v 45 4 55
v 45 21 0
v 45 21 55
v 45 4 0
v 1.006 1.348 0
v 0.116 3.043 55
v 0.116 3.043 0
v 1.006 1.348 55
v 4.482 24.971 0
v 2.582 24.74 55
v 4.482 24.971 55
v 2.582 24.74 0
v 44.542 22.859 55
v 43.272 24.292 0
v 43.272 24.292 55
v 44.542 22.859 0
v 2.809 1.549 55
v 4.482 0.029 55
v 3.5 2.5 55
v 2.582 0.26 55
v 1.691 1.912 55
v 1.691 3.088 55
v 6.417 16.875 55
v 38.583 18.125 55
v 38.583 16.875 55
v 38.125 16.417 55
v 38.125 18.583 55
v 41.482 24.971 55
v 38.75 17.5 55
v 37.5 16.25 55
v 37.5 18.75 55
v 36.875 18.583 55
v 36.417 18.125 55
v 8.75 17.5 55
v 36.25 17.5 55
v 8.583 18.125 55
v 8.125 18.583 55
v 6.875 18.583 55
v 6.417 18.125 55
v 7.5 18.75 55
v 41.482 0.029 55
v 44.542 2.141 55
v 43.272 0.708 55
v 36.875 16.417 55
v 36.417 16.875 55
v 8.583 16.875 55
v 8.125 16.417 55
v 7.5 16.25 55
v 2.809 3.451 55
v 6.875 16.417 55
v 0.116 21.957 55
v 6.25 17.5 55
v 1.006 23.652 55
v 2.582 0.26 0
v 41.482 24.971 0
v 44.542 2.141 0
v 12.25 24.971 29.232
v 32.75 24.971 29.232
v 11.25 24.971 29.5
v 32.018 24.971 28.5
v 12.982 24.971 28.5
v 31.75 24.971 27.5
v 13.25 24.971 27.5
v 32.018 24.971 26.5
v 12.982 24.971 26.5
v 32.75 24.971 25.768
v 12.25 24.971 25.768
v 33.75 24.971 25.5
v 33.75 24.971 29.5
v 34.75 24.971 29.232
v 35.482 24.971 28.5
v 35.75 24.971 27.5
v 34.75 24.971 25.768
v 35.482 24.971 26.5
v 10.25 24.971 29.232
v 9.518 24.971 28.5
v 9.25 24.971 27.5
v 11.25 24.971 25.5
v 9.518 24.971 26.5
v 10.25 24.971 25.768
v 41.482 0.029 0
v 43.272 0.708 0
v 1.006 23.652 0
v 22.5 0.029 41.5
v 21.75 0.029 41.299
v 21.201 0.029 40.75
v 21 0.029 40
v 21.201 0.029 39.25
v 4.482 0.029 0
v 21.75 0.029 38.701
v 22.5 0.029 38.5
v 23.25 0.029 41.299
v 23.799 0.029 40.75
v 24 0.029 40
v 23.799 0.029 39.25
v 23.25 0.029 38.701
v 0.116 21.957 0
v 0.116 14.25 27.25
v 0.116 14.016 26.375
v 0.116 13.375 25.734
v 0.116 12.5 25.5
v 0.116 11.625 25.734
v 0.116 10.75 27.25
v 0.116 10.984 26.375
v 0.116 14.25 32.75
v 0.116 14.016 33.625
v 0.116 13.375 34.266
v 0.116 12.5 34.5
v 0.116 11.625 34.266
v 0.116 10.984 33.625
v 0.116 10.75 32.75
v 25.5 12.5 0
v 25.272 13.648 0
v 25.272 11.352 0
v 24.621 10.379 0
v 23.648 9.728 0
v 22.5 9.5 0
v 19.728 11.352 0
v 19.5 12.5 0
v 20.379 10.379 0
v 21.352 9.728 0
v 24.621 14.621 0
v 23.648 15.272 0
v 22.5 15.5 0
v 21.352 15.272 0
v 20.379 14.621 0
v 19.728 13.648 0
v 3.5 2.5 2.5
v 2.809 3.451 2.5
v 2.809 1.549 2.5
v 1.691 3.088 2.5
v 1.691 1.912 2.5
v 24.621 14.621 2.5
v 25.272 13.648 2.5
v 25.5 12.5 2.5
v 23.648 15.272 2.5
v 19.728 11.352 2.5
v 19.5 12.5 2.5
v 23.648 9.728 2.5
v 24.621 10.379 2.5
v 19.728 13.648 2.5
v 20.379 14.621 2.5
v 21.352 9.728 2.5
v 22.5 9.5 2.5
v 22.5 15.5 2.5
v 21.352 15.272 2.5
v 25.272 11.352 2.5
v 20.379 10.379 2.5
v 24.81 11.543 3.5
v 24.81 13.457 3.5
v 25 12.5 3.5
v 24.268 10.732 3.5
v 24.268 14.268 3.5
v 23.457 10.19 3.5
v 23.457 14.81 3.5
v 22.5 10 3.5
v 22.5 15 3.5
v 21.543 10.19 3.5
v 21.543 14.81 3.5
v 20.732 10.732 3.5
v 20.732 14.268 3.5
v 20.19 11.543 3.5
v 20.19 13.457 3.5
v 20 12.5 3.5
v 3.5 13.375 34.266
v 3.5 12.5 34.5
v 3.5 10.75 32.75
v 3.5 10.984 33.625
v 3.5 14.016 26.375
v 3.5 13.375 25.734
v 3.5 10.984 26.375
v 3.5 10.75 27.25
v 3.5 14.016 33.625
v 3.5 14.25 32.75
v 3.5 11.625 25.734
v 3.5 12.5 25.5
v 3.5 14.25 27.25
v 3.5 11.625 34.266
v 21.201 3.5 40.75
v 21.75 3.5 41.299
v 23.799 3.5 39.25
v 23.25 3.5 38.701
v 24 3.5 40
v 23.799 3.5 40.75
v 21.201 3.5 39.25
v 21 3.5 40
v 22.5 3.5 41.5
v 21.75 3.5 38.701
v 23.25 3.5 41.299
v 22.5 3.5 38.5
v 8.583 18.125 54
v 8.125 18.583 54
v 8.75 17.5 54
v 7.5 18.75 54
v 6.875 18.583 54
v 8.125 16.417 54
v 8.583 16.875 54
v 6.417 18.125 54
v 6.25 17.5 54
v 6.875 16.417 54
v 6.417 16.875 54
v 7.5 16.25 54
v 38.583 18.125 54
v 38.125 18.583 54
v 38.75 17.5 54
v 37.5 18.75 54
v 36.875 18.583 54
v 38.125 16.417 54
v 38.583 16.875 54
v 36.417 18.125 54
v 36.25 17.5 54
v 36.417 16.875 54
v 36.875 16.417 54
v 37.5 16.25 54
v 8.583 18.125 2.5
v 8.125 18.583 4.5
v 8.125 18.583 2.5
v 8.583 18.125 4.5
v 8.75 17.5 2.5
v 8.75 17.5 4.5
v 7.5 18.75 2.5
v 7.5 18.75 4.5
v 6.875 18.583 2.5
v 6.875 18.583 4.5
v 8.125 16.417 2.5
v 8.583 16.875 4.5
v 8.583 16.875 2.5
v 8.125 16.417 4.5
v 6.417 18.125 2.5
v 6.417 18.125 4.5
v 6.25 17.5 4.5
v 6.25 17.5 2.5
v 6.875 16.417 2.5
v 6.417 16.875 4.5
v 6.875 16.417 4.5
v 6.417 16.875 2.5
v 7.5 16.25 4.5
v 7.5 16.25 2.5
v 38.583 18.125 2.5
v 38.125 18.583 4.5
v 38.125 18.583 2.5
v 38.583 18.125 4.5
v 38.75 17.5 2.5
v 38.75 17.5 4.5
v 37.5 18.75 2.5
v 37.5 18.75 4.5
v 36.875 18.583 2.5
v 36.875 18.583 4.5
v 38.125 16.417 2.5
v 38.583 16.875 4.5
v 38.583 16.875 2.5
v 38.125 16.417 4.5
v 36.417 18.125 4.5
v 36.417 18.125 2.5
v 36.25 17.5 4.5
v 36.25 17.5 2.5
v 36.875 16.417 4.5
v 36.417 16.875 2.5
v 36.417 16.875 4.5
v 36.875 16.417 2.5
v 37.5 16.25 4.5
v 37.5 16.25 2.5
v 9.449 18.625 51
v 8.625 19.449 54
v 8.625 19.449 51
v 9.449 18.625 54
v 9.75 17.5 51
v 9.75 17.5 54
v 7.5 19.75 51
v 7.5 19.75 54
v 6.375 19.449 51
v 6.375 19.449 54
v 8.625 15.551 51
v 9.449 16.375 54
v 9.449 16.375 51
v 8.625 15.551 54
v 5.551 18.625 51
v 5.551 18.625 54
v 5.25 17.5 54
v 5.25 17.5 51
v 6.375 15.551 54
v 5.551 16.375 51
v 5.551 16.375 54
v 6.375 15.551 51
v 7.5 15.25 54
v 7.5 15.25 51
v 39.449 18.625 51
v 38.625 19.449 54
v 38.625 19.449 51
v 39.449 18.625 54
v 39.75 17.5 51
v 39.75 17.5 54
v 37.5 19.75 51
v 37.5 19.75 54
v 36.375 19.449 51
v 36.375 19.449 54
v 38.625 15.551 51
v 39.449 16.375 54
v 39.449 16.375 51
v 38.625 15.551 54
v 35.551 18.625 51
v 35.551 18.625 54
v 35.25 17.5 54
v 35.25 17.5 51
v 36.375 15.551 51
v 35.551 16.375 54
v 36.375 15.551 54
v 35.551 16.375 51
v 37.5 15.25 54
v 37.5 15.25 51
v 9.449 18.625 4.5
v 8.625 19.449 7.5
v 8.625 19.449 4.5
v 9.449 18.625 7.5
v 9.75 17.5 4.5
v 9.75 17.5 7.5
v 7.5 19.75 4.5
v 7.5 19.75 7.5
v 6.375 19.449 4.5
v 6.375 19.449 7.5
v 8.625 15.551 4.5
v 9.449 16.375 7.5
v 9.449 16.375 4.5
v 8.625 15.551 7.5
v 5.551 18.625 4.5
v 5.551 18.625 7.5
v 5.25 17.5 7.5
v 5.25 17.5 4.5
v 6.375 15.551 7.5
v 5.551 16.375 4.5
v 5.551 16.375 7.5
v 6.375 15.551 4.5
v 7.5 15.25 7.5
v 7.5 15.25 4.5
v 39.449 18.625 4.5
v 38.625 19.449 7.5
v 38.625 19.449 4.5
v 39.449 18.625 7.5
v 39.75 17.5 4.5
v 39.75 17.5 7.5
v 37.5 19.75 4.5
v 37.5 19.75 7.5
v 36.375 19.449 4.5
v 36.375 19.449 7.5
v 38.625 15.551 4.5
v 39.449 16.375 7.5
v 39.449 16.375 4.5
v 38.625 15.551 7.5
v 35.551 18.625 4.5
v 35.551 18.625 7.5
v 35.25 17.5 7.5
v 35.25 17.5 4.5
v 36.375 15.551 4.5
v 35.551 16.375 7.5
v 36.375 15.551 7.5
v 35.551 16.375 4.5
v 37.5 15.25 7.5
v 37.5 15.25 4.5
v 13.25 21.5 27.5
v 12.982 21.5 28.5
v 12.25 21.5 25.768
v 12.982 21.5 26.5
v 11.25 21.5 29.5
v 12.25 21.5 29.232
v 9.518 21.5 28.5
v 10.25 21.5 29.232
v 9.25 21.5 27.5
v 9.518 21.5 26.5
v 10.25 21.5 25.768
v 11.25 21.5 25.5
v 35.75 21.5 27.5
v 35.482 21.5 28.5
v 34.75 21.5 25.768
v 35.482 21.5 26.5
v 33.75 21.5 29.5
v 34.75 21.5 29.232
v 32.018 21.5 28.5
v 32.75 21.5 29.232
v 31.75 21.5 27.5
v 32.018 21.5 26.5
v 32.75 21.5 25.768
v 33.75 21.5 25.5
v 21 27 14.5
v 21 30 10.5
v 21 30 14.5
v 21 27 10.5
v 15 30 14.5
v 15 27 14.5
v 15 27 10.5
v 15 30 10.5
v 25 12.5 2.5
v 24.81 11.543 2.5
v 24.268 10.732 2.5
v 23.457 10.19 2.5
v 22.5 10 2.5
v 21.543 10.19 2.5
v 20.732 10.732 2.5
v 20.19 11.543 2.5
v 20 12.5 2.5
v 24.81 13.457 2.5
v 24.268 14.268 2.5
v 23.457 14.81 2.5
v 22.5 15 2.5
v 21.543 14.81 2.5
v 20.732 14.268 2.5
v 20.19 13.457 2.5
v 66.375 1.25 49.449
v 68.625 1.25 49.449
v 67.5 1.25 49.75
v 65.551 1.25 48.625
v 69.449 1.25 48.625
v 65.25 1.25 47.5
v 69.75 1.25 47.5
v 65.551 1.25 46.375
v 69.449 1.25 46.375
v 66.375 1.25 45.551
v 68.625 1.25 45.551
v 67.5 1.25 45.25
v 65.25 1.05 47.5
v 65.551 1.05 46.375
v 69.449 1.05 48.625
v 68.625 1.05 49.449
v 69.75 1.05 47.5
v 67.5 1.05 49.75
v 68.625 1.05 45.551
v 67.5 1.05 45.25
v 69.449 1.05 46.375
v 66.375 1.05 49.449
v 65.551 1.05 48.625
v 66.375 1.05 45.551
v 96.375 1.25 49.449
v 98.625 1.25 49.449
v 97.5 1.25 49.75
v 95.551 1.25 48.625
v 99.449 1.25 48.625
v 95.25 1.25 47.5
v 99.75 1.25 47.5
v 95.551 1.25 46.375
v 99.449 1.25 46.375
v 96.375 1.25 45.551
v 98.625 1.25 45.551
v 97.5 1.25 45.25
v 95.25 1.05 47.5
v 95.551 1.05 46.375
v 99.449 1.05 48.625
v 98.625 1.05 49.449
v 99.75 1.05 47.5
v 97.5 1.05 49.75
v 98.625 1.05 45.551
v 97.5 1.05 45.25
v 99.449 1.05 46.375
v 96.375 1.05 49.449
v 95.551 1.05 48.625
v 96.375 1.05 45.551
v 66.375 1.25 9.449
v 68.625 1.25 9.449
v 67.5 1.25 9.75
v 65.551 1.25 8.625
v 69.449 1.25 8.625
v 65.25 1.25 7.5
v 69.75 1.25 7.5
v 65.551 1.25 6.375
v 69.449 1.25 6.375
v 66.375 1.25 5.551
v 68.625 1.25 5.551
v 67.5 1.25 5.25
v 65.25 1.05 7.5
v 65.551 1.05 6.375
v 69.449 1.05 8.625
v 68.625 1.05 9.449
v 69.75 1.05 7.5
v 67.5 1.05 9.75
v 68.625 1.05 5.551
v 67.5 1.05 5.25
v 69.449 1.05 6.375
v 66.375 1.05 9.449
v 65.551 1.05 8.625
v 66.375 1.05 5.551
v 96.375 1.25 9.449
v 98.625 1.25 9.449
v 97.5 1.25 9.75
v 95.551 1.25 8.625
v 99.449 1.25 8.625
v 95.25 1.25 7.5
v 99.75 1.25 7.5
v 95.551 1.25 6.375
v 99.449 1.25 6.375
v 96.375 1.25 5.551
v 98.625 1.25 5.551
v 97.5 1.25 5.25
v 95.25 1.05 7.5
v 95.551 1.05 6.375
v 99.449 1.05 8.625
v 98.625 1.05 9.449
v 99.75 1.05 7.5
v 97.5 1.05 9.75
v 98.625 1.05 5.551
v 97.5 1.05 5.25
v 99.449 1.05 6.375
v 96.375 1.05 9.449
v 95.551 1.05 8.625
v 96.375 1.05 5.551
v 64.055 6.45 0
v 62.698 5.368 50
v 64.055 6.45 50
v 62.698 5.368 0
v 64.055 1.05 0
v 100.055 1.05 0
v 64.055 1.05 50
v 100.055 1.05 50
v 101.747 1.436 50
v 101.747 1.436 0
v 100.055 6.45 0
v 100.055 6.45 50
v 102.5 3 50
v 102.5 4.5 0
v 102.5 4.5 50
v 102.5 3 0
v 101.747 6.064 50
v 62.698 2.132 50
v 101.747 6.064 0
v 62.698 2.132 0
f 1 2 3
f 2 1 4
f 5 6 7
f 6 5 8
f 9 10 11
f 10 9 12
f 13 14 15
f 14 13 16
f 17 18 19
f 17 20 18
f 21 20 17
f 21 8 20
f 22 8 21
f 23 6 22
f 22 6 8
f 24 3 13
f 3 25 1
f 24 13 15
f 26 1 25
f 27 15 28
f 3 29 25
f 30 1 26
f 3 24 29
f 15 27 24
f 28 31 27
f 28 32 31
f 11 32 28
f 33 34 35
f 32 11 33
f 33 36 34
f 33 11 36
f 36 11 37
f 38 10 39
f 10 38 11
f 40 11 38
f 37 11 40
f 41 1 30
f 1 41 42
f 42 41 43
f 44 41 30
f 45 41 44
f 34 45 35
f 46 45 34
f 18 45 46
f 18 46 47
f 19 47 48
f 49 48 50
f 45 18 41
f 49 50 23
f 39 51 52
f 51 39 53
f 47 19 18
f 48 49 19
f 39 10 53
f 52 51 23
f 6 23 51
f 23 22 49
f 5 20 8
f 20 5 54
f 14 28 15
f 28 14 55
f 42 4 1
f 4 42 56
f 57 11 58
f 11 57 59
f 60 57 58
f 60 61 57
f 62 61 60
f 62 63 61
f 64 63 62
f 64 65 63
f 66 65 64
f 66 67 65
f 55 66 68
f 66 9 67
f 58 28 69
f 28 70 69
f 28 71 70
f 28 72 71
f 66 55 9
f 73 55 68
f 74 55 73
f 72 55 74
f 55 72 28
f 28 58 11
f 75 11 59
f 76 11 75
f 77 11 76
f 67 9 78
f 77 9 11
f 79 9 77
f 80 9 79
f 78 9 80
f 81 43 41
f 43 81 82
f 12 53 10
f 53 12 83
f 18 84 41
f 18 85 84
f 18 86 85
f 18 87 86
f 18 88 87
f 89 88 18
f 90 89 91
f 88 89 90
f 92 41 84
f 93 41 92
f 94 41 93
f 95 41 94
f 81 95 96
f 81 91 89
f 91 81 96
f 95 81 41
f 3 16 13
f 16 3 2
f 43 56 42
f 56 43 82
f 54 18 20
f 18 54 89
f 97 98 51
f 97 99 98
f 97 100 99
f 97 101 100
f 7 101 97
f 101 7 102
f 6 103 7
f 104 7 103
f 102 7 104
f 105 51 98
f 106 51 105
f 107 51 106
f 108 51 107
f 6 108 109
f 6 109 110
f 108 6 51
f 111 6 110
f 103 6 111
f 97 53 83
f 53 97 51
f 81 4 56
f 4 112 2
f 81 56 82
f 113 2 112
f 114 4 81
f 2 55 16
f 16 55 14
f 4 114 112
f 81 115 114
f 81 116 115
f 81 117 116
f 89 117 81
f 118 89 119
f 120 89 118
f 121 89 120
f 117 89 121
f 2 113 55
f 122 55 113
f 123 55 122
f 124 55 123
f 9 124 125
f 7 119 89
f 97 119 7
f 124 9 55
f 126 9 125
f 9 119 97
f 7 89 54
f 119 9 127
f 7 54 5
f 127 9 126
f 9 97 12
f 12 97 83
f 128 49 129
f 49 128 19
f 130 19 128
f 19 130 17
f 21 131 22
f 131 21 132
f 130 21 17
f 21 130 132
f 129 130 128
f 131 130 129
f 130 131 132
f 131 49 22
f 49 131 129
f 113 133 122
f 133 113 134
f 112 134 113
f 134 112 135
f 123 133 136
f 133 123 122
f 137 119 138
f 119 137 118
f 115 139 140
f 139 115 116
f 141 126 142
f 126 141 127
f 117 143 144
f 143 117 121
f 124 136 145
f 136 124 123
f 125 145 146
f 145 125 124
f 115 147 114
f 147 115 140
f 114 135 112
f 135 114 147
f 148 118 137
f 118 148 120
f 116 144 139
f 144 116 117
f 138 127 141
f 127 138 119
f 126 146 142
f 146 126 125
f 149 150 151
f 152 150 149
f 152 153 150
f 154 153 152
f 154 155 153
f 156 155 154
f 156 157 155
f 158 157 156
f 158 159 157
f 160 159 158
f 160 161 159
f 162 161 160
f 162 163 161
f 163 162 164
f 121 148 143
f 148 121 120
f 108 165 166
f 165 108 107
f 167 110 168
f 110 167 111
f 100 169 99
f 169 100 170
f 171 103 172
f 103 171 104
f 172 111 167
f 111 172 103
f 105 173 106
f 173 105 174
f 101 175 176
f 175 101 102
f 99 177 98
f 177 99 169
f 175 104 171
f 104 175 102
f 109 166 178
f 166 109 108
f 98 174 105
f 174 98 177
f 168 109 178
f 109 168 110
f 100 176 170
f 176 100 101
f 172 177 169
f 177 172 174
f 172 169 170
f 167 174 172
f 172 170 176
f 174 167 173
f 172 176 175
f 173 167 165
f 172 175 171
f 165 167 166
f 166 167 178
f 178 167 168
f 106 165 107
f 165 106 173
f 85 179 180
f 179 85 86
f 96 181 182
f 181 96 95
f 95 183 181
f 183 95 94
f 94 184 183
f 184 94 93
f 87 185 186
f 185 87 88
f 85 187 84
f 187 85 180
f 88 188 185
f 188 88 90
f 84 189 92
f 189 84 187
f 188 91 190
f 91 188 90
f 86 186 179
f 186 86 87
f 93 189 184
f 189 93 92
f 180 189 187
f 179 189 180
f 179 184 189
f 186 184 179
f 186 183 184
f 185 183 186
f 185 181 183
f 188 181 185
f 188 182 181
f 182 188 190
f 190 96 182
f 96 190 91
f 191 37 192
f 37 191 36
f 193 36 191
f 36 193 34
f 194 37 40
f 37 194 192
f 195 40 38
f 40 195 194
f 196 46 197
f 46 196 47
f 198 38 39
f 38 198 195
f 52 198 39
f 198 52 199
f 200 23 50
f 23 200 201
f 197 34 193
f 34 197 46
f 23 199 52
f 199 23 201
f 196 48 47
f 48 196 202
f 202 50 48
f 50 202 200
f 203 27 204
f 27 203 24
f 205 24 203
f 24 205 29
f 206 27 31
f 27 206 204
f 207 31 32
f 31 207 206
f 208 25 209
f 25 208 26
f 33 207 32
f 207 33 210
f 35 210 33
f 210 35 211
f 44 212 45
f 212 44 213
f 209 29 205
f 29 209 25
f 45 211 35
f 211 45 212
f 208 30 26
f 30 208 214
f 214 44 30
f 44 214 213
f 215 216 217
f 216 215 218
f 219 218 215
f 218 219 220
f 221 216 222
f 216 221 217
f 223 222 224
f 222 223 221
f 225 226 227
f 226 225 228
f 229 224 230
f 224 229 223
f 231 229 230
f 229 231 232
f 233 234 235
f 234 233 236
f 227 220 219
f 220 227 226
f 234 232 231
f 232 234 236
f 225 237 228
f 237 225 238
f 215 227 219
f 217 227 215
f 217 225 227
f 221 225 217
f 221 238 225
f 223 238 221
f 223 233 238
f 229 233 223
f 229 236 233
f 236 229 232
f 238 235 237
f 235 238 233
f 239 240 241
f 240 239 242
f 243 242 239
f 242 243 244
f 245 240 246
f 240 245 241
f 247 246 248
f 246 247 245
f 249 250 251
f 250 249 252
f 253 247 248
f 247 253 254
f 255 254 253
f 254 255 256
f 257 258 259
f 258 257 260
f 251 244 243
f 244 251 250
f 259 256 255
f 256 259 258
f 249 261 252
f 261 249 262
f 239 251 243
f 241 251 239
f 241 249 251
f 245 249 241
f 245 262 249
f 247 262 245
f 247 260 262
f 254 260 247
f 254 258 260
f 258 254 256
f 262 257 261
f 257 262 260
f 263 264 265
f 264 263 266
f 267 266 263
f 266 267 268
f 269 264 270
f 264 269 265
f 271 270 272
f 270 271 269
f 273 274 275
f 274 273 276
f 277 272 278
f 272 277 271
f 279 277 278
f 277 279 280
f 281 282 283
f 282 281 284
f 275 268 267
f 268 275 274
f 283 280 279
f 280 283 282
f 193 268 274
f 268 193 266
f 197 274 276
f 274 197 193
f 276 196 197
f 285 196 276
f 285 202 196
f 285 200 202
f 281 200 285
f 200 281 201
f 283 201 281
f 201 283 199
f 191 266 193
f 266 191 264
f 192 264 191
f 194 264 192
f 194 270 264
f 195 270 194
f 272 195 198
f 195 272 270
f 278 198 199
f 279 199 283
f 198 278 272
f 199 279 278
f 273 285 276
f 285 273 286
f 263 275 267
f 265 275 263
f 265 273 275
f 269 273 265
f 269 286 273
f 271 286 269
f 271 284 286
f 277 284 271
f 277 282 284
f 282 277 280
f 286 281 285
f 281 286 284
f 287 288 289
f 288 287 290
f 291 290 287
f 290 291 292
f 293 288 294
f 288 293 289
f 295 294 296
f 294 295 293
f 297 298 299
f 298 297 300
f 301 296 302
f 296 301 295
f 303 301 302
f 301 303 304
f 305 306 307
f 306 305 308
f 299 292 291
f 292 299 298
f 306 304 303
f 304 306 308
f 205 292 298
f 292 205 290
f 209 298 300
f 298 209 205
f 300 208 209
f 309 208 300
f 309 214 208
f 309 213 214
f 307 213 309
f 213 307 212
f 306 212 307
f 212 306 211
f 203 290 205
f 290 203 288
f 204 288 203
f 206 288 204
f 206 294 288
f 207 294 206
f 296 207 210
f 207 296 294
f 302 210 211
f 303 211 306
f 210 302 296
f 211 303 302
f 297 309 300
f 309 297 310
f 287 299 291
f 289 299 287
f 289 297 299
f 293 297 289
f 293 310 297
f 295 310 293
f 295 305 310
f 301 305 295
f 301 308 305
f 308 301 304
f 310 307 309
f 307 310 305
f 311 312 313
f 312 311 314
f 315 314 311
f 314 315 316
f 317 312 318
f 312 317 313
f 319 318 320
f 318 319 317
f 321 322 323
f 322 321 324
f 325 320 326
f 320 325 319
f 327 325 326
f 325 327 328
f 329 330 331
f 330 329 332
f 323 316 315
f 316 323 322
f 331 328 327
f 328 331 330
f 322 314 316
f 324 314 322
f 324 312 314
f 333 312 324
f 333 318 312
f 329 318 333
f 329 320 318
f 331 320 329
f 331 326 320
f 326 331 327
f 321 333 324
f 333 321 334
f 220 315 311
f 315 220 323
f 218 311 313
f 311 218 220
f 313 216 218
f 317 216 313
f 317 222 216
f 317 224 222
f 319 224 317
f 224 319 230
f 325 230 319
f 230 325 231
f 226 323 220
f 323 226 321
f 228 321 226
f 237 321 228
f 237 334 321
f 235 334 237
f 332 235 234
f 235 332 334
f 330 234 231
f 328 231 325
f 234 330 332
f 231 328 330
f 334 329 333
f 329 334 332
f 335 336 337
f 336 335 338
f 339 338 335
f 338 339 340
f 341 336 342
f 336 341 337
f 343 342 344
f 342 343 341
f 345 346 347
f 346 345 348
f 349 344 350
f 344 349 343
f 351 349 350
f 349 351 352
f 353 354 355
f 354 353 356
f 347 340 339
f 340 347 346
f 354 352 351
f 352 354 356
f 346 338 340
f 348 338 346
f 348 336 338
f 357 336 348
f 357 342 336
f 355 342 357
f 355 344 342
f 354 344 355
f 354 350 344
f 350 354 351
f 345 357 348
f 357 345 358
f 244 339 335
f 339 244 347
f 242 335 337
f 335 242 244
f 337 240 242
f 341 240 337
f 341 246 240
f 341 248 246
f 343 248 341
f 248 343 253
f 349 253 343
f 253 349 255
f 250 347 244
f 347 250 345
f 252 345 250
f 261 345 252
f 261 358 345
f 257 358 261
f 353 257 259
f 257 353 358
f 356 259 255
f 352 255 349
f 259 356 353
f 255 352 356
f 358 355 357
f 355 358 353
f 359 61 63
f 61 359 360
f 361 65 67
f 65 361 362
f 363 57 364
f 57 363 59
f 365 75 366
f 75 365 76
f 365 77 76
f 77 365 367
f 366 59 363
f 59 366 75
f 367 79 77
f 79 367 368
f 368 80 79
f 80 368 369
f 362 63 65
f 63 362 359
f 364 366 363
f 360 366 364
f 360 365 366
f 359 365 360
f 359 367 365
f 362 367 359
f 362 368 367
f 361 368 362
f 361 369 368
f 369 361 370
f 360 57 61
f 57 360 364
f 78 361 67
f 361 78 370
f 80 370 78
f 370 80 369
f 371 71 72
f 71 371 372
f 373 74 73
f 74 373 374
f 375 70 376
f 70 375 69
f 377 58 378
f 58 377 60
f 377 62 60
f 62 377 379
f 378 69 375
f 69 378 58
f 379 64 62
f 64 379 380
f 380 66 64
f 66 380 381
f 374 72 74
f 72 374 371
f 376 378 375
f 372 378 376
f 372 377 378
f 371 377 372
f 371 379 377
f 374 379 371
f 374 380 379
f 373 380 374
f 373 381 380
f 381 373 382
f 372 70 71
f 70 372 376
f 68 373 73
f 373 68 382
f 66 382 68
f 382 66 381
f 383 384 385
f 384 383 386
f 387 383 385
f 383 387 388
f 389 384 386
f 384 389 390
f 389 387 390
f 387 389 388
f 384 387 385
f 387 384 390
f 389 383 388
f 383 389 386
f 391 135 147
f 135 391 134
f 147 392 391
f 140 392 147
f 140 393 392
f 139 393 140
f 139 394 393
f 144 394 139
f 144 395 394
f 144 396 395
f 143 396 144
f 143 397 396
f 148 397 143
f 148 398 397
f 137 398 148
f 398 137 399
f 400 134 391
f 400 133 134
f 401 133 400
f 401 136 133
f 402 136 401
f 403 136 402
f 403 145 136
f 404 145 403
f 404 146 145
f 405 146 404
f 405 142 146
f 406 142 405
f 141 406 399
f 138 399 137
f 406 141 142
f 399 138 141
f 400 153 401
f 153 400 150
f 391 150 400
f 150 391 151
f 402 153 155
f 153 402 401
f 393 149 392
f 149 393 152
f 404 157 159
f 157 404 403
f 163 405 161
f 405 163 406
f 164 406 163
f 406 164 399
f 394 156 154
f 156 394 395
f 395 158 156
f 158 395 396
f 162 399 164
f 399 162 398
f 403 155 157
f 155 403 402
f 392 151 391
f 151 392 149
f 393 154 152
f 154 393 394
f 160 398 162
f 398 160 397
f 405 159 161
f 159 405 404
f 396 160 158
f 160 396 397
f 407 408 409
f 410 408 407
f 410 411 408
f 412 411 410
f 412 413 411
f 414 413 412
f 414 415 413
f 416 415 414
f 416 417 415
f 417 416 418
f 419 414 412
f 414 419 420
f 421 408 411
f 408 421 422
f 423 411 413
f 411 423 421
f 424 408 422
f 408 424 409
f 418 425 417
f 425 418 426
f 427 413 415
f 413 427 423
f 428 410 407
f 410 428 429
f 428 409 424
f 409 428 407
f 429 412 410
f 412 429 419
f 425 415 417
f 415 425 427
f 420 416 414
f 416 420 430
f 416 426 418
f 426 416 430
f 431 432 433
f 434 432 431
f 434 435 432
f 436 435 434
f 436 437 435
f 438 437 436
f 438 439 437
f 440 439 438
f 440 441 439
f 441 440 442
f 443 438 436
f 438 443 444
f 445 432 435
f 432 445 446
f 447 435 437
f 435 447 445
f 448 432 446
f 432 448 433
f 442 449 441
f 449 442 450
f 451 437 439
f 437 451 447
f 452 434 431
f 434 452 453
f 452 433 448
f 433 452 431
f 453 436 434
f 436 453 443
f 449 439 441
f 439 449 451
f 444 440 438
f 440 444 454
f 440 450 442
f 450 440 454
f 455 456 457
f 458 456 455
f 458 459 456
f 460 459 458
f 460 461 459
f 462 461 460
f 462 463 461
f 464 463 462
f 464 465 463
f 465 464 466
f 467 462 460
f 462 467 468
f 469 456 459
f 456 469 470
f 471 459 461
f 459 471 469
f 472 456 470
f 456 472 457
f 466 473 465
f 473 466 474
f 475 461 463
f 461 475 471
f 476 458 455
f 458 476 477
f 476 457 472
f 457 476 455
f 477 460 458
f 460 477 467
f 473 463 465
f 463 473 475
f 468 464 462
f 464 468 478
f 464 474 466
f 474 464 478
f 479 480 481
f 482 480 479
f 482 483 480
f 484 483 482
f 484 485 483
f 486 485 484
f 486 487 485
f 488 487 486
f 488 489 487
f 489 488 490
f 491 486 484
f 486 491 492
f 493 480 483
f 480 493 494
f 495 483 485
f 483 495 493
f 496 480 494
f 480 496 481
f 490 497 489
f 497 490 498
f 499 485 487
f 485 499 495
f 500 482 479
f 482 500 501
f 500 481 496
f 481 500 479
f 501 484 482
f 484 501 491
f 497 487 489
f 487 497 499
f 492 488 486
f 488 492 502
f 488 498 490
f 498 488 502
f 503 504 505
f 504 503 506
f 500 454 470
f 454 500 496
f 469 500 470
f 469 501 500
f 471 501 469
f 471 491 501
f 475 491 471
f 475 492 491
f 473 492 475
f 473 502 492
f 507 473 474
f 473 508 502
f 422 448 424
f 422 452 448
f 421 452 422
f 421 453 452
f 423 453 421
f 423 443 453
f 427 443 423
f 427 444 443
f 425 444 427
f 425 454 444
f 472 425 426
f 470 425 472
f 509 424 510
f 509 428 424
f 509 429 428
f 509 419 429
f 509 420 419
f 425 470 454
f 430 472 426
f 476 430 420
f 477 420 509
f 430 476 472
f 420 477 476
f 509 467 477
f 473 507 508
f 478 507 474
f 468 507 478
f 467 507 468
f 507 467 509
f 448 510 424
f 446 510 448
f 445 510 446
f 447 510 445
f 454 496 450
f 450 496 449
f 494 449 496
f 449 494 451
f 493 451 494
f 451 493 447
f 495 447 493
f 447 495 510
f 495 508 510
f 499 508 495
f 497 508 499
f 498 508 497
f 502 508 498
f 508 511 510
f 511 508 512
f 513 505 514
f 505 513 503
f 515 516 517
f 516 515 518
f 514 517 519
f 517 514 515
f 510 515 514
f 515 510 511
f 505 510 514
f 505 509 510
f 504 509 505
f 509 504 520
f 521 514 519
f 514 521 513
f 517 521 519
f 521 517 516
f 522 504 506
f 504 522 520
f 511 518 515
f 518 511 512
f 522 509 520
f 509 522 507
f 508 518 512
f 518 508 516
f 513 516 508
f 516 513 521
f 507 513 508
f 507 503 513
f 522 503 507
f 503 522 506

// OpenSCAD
// Water Leak Sensor Case
// Xiao ESP32-S3 with UHPPOTE probe
// USB-C powered, screw-on access panel

// ============================================
// PARAMETERS
// ============================================

// Case dimensions
case_width = 45;
case_depth = 25;
case_height = 55;

// Wall thickness
wall = 2.5;

// Access panel (back)
panel_thickness = 2;
screw_diam = 2.5;  // M2.5 screws
screw_head_diam = 4.5;
screw_head_depth = 2;

// Xiao ESP32-S3 dimensions
xiao_width = 21;
xiao_depth = 17.5;

// Probe wire exit
wire_hole = 6;  // For probe cable

// USB-C port
usb_width = 9;
usb_height = 3.5;

// LED indicator
led_diam = 3;

// ============================================
// HELPERS
// ============================================

module rounded_box(l, w, h, r) {
    hull() {
        translate([r, r, 0]) cylinder(r=r, h=h);
        translate([l-r, r, 0]) cylinder(r=r, h=h);
        translate([r, w-r, 0]) cylinder(r=r, h=h);
        translate([l-r, w-r, 0]) cylinder(r=r, h=h);
    }
}

// ============================================
// CASE BODY (main enclosure)
// ============================================

module case_body() {
    difference() {
        // Outer shell
        rounded_box(case_width, case_depth, case_height, 4);
        
        // Inner cavity (open at back)
        translate([wall, wall, wall])
        rounded_box(
            case_width - wall * 2,
            case_depth - wall * 2,
            case_height
        );
        
        // Probe wire exit (bottom, back)
        translate([case_width/2, case_depth/2, -1])
        cylinder(d=wire_hole, h=wall + 2, $fn=16);
        
        // USB-C port (side, near top)
        translate([-1, case_depth/2, case_height - 25])
        rotate([0, 90, 0])
        hull() {
            translate([-usb_width/2 + usb_height/2, 0, 0])
            cylinder(d=usb_height, h=wall + 2, $fn=12);
            translate([usb_width/2 - usb_height/2, 0, 0])
            cylinder(d=usb_height, h=wall + 2, $fn=12);
        }
        
        // LED hole (front, near top)
        translate([case_width/2, -1, case_height - 15])
        rotate([-90, 0, 0])
        cylinder(d=led_diam, h=wall + 2, $fn=12);
        
        // Screw holes for access panel (back)
        // Top left
        translate([wall + 5, case_depth - wall - 5, case_height - wall])
        cylinder(d=screw_diam, h=wall + 2, $fn=12);
        // Top right
        translate([case_width - wall - 5, case_depth - wall - 5, case_height - wall])
        cylinder(d=screw_diam, h=wall + 2, $fn=12);
        // Bottom left
        translate([wall + 5, case_depth - wall - 5, wall])
        cylinder(d=screw_diam, h=wall + 2, $fn=12);
        // Bottom right
        translate([case_width - wall - 5, case_depth - wall - 5, wall])
        cylinder(d=screw_diam, h=wall + 2, $fn=12);
        
        // Screw head recesses
        // Top left
        translate([wall + 5, case_depth - wall - 5, case_height - panel_thickness - screw_head_depth])
        cylinder(d=screw_head_diam, h=screw_head_depth + 1, $fn=12);
        // Top right
        translate([case_width - wall - 5, case_depth - wall - 5, case_height - panel_thickness - screw_head_depth])
        cylinder(d=screw_head_diam, h=screw_head_depth + 1, $fn=12);
        // Bottom left
        translate([wall + 5, case_depth - wall - 5, wall + panel_thickness])
        cylinder(d=screw_head_diam, h=screw_head_depth + 1, $fn=12);
        // Bottom right
        translate([case_width - wall - 5, case_depth - wall - 5, wall + panel_thickness])
        cylinder(d=screw_head_diam, h=screw_head_depth + 1, $fn=12);
        
        // Mounting holes (back panel) - for wall/cabinet mounting
        translate([case_width/4, case_depth + 1, case_height/2])
        rotate([90, 0, 0])
        cylinder(d=4, h=wall + 2, $fn=12);
        
        translate([case_width * 3/4, case_depth + 1, case_height/2])
        rotate([90, 0, 0])
        cylinder(d=4, h=wall + 2, $fn=12);
    }
    
    // Internal mounting posts for Xiao
    translate([wall + 5, wall + 5, wall + 8])
    xiao_mount();
    
    // Cable strain relief (internal, near wire exit)
    translate([case_width/2 - 4, case_depth/2 - 4, wall])
    difference() {
        cube([8, 8, 3]);
        translate([4, 4, -1])
        cylinder(d=wire_hole - 1, h=5, $fn=16);
    }
}

// ============================================
// XIAO MOUNT
// ============================================

module xiao_mount() {
    post_h = 4;
    post_d = 5;
    hole_d = 2;
    
    // Corner posts with holes for Xiao
    for (x = [0, xiao_width - 5]) {
        for (y = [0, xiao_depth - 5]) {
            translate([x, y, 0])
            difference() {
                cylinder(d=post_d, h=post_h, $fn=12);
                translate([0, 0, 1])
                cylinder(d=hole_d, h=post_h, $fn=8);
            }
        }
    }
    
    // Support rail under USB-C
    translate([xiao_width/2 - 3, xiao_depth + 2, 0])
    cube([6, 3, post_h]);
}

// ============================================
// ACCESS PANEL (back cover)
// ============================================

module access_panel() {
    panel_w = case_width - wall * 2;
    panel_h = case_height - wall * 2;
    
    difference() {
        // Panel body
        translate([wall, wall, 0])
        rounded_box(panel_w, wall, panel_h, 2);
        
        // Screw holes (countersunk from outside)
        // Top left
        translate([wall + 5, wall/2, case_height - wall - 5])
        rotate([90, 0, 0]) {
            cylinder(d=screw_diam, h=panel_thickness + 2, $fn=12);
            translate([0, 0, panel_thickness - screw_head_depth])
            cylinder(d=screw_head_diam, h=screw_head_depth + 1, $fn=12);
        }
        // Top right
        translate([case_width - wall - 5, wall/2, case_height - wall - 5])
        rotate([90, 0, 0]) {
            cylinder(d=screw_diam, h=panel_thickness + 2, $fn=12);
            translate([0, 0, panel_thickness - screw_head_depth])
            cylinder(d=screw_head_diam, h=screw_head_depth + 1, $fn=12);
        }
        // Bottom left
        translate([wall + 5, wall/2, wall + 5])
        rotate([90, 0, 0]) {
            cylinder(d=screw_diam, h=panel_thickness + 2, $fn=12);
            translate([0, 0, panel_thickness - screw_head_depth])
            cylinder(d=screw_head_diam, h=screw_head_depth + 1, $fn=12);
        }
        // Bottom right
        translate([case_width - wall - 5, wall/2, wall + 5])
        rotate([90, 0, 0]) {
            cylinder(d=screw_diam, h=panel_thickness + 2, $fn=12);
            translate([0, 0, panel_thickness - screw_head_depth])
            cylinder(d=screw_head_diam, h=screw_head_depth + 1, $fn=12);
        }
    }
}

// ============================================
// RENDER OPTIONS
// ============================================

// === Print both parts ===
case_body();
translate([case_width + 15, 0, 0]) access_panel();

// === Print case only ===
// case_body();

// === Print panel only ===
// access_panel();
